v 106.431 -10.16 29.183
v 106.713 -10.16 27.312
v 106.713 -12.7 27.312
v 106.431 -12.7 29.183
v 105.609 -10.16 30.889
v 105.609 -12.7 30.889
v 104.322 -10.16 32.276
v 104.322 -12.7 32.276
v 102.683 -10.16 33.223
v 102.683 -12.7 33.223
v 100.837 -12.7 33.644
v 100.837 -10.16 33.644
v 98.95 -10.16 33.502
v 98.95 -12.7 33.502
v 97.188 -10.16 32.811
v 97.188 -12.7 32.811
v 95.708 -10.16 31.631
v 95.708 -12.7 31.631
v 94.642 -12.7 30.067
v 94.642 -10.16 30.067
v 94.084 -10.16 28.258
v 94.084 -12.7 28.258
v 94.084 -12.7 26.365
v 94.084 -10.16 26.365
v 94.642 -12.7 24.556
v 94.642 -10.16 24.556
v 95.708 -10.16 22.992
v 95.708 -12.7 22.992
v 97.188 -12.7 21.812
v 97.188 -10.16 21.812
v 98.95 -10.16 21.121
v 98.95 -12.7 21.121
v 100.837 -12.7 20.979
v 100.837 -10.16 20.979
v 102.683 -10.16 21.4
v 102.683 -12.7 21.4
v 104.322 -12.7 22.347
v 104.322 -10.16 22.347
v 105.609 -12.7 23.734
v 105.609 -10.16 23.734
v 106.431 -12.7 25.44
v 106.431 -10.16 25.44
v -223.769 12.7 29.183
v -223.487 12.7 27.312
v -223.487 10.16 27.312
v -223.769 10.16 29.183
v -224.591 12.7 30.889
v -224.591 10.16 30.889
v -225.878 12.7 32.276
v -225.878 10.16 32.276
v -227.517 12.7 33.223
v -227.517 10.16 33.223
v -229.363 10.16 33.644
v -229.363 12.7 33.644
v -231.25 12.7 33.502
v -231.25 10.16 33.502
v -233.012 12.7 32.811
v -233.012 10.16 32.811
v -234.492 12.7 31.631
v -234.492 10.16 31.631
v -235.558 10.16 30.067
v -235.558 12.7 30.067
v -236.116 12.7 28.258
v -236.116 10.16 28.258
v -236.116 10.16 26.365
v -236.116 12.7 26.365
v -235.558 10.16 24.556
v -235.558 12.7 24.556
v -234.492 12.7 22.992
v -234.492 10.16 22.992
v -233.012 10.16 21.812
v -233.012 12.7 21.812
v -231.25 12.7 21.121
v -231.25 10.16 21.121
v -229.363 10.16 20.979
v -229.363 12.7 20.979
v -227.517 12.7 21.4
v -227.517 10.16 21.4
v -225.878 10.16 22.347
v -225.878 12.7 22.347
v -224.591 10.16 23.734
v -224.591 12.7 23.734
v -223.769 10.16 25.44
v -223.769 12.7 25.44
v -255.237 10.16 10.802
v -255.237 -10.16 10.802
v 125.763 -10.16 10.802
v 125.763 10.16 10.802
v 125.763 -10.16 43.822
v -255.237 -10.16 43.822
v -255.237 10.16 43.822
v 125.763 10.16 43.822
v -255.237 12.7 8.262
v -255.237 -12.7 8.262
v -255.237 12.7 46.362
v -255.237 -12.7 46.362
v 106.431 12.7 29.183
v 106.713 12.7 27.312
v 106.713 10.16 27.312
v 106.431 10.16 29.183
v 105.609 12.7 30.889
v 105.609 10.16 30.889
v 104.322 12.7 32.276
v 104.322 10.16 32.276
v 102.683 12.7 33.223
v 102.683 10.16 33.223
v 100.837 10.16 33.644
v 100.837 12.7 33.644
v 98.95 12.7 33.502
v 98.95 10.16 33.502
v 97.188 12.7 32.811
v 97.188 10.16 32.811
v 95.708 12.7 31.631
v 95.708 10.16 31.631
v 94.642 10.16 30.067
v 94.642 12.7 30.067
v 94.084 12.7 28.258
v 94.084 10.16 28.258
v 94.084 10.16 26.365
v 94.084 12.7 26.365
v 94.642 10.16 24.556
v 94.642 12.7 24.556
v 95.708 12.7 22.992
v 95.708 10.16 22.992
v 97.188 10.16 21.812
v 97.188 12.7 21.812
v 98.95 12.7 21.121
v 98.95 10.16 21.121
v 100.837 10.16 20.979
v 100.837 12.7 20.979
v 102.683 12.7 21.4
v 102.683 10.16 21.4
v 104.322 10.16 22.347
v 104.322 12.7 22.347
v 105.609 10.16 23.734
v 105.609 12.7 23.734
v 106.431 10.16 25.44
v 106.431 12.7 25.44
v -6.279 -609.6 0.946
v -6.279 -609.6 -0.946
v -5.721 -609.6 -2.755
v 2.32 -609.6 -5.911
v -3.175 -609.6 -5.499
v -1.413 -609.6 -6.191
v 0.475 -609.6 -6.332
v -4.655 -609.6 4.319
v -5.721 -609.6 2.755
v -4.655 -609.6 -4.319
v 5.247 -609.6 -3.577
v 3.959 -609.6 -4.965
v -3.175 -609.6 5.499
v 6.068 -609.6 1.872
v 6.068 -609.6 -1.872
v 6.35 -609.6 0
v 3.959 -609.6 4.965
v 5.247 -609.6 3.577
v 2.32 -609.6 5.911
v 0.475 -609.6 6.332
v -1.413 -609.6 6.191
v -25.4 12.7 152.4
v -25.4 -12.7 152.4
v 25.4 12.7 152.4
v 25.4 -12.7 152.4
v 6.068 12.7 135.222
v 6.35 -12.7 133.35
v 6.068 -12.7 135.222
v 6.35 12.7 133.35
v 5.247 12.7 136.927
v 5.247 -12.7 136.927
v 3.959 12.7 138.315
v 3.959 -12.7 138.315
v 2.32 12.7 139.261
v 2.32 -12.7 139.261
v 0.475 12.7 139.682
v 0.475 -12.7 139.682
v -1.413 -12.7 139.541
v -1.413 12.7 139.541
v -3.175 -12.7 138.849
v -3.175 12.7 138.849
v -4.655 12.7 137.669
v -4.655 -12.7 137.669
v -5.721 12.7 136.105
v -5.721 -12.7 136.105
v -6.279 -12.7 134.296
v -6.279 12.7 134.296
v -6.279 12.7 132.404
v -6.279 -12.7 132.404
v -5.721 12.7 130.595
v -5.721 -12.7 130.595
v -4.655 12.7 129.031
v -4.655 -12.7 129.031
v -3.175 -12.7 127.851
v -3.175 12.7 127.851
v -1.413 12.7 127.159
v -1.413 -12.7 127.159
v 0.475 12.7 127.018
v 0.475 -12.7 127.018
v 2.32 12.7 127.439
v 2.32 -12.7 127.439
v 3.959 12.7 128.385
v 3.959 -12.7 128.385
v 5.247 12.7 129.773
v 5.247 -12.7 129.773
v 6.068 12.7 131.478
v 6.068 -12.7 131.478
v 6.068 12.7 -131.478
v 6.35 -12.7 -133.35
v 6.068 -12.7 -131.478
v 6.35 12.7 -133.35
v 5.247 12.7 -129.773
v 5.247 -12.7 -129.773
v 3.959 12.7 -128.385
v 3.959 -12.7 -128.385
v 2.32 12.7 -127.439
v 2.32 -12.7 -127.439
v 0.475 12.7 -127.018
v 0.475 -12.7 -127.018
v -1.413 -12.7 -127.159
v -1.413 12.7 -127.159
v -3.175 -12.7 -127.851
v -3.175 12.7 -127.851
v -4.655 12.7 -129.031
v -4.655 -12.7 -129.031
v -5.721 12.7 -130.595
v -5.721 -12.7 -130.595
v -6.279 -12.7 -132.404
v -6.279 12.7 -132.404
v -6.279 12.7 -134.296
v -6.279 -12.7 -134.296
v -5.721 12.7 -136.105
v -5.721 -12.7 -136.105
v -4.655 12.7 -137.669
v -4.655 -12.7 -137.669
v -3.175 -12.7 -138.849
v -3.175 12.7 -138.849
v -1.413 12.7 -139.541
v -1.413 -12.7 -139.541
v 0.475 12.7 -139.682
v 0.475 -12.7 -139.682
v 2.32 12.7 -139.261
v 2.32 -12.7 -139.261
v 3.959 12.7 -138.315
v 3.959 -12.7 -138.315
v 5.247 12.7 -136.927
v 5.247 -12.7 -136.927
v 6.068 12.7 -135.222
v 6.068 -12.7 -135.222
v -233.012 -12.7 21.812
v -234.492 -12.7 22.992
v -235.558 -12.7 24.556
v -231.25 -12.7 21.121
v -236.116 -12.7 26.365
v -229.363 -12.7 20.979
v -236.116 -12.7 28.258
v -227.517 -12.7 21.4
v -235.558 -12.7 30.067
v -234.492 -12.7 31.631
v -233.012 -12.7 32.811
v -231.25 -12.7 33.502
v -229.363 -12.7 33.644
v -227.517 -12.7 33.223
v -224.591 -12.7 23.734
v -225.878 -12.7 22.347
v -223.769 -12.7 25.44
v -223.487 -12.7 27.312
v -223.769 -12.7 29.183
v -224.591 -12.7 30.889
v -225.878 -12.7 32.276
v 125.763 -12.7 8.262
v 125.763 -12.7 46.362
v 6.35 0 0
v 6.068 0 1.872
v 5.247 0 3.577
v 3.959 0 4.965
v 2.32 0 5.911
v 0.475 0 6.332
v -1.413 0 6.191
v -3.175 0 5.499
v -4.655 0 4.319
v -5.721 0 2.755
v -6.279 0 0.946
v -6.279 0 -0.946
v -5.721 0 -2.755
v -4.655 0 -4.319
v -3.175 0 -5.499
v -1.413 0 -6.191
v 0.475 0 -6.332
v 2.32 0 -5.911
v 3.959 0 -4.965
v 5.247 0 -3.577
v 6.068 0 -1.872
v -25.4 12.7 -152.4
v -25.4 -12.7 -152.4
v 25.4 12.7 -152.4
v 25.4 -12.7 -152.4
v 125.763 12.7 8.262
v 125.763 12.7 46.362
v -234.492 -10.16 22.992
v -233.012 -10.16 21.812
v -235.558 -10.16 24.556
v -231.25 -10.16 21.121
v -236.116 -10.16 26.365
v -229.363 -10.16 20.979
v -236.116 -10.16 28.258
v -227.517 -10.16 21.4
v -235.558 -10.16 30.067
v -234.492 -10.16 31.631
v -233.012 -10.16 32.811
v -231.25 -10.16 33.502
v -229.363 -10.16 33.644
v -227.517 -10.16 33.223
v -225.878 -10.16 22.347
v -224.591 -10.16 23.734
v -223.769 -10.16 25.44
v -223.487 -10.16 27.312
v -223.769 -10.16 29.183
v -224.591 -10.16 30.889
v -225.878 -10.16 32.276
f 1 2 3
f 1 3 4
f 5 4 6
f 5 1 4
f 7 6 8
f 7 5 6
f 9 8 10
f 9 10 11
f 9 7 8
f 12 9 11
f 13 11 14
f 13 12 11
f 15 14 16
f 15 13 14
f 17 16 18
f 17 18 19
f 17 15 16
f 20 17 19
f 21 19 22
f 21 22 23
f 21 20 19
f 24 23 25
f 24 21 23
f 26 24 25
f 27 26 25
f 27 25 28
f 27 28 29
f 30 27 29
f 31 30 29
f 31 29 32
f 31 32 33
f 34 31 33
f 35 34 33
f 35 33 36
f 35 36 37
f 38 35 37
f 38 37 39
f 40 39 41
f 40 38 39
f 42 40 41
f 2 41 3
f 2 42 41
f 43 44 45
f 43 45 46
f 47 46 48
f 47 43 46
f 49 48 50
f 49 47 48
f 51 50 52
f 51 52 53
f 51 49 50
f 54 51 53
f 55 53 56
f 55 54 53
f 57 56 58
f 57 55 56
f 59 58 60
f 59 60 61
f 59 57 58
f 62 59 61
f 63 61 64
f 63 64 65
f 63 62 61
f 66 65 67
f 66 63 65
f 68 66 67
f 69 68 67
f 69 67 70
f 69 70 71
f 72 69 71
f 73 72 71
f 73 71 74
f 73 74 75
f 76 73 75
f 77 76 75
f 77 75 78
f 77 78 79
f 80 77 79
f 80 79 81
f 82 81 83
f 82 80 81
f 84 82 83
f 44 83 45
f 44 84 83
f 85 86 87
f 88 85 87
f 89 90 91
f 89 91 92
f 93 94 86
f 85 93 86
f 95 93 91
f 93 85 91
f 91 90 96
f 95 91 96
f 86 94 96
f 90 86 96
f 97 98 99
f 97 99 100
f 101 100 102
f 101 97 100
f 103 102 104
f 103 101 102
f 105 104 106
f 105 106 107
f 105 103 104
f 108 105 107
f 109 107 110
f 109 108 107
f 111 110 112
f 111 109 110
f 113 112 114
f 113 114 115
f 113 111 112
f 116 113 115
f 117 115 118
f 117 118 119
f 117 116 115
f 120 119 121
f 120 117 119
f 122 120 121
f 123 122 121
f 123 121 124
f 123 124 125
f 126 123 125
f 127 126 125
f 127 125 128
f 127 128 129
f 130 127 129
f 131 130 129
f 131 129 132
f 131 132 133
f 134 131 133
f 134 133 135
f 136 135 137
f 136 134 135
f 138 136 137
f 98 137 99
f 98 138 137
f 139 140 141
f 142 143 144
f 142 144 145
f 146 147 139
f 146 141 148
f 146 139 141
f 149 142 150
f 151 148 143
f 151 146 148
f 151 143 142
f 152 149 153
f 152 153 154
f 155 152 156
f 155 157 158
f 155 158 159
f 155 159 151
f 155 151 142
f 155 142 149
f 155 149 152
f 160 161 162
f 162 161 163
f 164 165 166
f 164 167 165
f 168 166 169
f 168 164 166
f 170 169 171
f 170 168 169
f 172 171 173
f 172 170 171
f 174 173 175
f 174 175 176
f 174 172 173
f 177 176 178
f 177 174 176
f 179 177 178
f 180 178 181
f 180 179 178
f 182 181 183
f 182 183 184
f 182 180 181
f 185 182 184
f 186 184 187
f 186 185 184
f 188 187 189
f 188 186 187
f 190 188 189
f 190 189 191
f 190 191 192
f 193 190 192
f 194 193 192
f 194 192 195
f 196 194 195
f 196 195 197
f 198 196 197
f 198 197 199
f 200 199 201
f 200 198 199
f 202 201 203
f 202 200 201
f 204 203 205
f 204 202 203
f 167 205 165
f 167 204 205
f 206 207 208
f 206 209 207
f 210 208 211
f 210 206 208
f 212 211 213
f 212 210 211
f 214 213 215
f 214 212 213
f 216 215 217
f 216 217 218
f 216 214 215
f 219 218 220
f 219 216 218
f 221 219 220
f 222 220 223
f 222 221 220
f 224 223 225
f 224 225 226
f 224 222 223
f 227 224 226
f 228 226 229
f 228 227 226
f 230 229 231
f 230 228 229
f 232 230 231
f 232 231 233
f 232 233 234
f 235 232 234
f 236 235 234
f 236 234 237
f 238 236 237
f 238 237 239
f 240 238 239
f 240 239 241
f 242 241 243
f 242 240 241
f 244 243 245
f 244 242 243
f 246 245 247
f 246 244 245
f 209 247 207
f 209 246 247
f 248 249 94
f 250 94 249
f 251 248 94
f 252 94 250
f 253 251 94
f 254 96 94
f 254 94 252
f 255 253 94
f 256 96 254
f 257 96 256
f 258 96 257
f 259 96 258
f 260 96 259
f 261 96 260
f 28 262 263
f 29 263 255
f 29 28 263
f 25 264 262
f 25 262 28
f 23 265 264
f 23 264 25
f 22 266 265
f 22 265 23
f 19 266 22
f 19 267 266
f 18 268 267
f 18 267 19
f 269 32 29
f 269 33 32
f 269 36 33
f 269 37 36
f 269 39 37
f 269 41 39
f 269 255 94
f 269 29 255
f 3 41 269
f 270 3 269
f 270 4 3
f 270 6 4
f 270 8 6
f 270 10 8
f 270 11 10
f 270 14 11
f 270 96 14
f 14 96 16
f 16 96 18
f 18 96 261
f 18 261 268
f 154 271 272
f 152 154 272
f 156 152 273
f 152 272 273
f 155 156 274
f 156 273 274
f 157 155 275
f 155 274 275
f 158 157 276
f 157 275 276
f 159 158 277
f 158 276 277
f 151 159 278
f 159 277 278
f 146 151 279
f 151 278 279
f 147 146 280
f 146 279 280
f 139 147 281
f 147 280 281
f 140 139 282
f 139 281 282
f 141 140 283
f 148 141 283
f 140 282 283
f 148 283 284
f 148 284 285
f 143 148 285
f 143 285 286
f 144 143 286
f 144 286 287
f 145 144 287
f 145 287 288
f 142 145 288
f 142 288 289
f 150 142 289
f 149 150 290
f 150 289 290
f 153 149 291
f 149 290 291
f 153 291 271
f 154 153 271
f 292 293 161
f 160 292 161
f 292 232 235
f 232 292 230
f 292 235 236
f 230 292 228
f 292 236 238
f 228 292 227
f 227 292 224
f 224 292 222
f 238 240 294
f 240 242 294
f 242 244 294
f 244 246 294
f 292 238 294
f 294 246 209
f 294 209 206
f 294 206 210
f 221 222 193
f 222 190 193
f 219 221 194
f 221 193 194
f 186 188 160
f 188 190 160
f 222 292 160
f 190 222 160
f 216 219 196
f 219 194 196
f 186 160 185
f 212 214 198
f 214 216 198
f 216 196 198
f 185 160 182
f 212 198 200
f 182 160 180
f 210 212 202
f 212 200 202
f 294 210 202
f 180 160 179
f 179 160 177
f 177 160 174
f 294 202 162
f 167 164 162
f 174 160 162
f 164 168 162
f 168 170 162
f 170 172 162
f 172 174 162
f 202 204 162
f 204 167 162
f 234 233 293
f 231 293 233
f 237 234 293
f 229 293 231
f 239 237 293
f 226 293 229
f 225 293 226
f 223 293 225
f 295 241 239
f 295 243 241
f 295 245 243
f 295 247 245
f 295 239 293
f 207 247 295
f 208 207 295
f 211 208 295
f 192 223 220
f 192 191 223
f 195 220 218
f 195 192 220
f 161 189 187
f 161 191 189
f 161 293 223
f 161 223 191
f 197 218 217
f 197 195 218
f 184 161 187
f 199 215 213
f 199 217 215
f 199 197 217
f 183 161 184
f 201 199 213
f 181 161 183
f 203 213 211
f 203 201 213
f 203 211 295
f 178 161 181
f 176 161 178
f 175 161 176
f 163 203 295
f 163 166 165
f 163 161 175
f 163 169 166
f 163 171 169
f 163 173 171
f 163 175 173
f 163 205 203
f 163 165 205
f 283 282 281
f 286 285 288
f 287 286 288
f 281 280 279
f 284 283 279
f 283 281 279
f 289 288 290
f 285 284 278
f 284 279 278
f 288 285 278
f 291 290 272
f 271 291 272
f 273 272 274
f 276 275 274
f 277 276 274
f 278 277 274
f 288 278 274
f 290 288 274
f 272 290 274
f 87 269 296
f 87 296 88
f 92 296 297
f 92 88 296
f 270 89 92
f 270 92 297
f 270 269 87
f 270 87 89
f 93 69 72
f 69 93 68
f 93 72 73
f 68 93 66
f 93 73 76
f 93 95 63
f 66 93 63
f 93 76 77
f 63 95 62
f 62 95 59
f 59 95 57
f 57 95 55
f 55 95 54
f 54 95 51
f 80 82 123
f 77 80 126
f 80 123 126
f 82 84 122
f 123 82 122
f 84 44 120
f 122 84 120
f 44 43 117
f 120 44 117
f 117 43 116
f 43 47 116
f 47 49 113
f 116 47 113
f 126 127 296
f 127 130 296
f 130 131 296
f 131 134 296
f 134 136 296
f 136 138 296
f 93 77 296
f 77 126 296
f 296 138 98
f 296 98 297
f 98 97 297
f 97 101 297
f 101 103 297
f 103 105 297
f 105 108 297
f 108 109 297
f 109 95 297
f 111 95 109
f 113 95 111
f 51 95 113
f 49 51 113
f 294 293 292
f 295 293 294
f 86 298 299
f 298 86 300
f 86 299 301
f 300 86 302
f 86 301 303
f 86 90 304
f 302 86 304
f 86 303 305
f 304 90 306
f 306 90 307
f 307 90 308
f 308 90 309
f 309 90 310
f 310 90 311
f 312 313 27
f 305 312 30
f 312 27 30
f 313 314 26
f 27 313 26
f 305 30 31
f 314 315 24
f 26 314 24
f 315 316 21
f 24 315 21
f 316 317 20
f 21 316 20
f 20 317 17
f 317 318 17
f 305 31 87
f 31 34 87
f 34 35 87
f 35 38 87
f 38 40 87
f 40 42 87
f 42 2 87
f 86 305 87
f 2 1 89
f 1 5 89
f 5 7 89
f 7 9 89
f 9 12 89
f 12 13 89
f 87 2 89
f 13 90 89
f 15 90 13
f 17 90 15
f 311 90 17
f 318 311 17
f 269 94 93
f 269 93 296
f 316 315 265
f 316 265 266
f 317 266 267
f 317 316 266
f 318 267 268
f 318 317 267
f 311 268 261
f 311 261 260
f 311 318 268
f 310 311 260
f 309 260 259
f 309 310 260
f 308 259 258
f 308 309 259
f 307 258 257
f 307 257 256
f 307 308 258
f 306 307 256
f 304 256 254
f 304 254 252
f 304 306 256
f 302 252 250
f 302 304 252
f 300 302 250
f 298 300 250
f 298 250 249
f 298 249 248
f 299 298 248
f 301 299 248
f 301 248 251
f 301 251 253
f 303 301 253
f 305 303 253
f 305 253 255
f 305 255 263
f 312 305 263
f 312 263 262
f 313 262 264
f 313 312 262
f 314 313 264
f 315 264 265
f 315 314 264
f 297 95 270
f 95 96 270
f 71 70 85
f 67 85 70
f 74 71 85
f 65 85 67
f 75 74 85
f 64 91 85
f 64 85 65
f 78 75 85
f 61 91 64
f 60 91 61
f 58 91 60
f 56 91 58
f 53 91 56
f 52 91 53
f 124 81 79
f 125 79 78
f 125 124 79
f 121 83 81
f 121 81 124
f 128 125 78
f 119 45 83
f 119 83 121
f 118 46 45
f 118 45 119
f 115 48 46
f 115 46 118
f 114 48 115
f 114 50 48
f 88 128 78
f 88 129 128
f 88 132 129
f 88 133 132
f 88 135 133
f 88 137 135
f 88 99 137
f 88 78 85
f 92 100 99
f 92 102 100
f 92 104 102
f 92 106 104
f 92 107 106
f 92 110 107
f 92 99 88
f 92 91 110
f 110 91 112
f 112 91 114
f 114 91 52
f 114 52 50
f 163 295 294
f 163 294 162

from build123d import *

# Parameters (mm, degrees)
F0_W     = 50.8
F0_H     = 304.8
F0_R     = 6.35
F1_DEPTH = 12.7
F2_W     = 381
F2_H     = 38.1
F2_R     = 6.35
F3_DEPTH = 12.7
F4_T     = -2.54
F5_R     = 6.35
F6_DEPTH = 609.6


with BuildPart() as f1:
    # F0 (on Front) → F1 (new body, symmetric)
    with BuildSketch(Plane.XZ):
        Rectangle(F0_W, F0_H)
        with Locations((0, -133.35)):
            Circle(F0_R, mode=Mode.SUBTRACT)
        with Locations((0, 133.35)):
            Circle(F0_R, mode=Mode.SUBTRACT)
    extrude(amount=F1_DEPTH, both=True)


with BuildPart() as f3:
    # F2 (on Front) → F3 (new body, symmetric)
    with BuildSketch(Plane.XZ):
        with Locations((-64.737284, 27.311547)):
            Rectangle(F2_W, F2_H)
        with Locations((-229.837284, 27.311547)):
            Circle(F2_R, mode=Mode.SUBTRACT)
        with Locations((100.362716, 27.311547)):
            Circle(F2_R, mode=Mode.SUBTRACT)
    extrude(amount=F3_DEPTH, both=True)

    # F4
    f4_openings = [f3.faces().sort_by_distance(p)[0] for p in [
        (-255.237284, 0, 27.311547),
        (-236.187284, 0, 27.311547),
        (125.762716, 0, 27.311547),
        (94.012716, 0, 27.311547),
    ]]
    offset(amount=F4_T, openings=f4_openings)


with BuildPart() as f6:
    # F5 (on Front) → F6 (new body)
    with BuildSketch(Plane.XZ):
        Circle(F5_R)
    extrude(amount=F6_DEPTH)


solid = Compound([f1.part, f3.part, f6.part])
